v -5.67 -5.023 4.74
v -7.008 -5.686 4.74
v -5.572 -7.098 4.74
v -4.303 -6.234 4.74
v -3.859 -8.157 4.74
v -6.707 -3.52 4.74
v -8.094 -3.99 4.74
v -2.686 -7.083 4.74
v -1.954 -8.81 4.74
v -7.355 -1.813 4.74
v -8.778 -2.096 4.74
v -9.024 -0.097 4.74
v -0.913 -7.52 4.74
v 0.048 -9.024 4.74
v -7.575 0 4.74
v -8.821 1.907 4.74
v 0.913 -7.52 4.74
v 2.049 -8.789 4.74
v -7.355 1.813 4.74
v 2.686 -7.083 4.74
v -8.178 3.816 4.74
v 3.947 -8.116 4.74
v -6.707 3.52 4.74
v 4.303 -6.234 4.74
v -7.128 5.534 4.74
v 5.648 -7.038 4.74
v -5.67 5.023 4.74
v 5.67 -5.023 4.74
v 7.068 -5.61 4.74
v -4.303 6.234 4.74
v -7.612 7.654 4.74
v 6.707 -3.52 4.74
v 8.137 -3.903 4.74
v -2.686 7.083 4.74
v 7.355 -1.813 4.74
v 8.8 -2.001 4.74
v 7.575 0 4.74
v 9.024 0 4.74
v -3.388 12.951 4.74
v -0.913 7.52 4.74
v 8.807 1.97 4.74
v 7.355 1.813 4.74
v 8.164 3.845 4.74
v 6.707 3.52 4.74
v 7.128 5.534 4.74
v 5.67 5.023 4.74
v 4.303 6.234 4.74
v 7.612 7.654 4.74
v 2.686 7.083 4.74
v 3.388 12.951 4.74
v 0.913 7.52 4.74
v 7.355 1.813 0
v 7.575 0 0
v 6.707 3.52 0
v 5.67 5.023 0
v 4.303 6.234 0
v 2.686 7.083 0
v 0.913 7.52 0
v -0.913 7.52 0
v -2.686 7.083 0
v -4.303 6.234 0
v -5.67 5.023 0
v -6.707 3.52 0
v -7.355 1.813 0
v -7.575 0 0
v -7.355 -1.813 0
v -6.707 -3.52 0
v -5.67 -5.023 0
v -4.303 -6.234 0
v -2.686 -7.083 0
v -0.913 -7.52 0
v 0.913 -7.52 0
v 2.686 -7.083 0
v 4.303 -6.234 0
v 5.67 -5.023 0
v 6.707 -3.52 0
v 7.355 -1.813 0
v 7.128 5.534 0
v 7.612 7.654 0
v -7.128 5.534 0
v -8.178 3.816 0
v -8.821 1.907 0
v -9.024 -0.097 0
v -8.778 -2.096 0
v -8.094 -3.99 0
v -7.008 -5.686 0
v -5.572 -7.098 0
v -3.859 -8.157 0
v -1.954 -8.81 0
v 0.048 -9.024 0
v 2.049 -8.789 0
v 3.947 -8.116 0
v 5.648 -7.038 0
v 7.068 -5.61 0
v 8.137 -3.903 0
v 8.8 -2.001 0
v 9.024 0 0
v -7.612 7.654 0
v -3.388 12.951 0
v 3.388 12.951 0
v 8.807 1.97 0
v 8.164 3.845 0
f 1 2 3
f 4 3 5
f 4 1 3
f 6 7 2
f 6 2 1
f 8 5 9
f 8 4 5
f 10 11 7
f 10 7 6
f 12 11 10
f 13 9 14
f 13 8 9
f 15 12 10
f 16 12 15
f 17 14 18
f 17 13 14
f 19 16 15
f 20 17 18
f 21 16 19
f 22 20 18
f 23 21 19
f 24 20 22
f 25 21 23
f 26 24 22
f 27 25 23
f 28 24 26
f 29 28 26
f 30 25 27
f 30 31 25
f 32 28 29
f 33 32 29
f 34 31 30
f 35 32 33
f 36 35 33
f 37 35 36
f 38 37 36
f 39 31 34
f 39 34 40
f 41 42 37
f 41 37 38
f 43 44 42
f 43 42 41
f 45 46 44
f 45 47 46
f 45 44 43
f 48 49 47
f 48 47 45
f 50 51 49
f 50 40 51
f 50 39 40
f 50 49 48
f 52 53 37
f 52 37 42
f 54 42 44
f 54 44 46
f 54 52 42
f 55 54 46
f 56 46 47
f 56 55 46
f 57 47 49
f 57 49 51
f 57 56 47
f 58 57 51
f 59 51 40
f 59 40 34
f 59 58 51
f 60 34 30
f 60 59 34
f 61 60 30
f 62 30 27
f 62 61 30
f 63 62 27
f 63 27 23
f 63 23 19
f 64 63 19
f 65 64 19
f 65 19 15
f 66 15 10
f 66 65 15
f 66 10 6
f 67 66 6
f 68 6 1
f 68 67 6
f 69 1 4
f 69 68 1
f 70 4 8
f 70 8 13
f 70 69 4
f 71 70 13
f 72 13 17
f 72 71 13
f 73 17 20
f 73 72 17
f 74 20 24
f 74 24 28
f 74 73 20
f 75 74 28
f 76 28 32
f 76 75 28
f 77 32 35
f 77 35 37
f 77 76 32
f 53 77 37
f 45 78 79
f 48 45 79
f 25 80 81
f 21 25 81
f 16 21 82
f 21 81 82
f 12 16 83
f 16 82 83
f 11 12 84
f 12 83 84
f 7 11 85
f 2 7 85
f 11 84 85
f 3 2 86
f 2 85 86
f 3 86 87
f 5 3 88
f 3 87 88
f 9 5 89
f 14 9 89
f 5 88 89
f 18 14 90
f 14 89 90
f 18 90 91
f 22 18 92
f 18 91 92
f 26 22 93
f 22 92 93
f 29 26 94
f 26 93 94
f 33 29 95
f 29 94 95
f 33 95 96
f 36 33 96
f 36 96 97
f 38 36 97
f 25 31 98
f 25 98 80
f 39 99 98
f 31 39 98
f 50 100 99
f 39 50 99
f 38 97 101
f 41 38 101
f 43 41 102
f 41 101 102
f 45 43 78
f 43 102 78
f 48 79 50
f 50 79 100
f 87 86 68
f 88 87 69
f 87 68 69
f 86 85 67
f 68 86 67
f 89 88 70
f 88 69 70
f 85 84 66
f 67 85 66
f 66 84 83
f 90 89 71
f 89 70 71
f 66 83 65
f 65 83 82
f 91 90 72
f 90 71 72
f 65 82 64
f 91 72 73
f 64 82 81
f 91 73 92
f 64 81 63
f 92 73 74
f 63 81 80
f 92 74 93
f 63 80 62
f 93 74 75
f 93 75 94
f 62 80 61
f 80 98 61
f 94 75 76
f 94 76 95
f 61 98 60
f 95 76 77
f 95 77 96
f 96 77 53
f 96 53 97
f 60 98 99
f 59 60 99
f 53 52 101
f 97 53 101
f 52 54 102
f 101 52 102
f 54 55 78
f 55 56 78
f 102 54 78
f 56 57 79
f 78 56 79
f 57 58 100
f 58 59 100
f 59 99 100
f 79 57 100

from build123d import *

# Parameters (mm, degrees)
F0_R     = 7.575
F1_DEPTH = 4.74


with BuildPart() as f1:
    # F0 (on Top) → F1 (new body)
    with BuildSketch(Plane.XY):
        with BuildLine():
            ThreePointArc((-7.128206, 5.534247), (-2.925035, -8.537176), (9.024367, 0))
            ThreePointArc((9.024367, 0), (8.537176, 2.925035), (7.128205, 5.534247))
            ThreePointArc((7.128205, 5.534247), (0, 9.024367), (-7.128206, 5.534247))
        make_face()
        Circle(F0_R, mode=Mode.SUBTRACT)
        with BuildLine():
            ThreePointArc((-7.128206, 5.534247), (0, 9.024367), (7.128205, 5.534247))
            Line((7.128205, 5.534247), (7.611939, 7.653624))
            Line((7.611939, 7.653624), (3.387632, 12.950739))
            Line((3.387632, 12.950739), (-3.387632, 12.950739))
            Line((-3.387632, 12.950739), (-7.61194, 7.653624))
            Line((-7.61194, 7.653624), (-7.128206, 5.534247))
        make_face()
    extrude(amount=F1_DEPTH)


solid = f1.part
